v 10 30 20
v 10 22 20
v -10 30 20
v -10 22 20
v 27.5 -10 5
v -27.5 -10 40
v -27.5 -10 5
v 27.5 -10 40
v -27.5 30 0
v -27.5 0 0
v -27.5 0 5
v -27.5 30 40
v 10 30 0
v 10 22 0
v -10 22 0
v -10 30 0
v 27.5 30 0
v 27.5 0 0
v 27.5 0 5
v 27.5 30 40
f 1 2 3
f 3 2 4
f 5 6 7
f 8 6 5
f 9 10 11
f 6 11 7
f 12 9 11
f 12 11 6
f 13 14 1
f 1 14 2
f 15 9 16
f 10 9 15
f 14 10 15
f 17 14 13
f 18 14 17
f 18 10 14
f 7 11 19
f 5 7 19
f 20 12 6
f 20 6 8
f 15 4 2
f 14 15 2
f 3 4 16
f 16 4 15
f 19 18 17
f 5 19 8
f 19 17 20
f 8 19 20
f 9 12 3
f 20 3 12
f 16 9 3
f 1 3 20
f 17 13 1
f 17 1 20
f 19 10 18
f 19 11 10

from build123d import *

# Parameters (mm, degrees)
BOSS_EXTRUDE1_DEPTH = 30
SKETCH2_W           = 20
SKETCH2_H           = 20
BOSS_EXTRUDE2_DEPTH = 22
SKETCH3_W           = 55
SKETCH3_H           = 35
BOSS_EXTRUDE3_DEPTH = 10


with BuildPart() as part:
    # Sketch1 → Boss-Extrude1 (new body)
    with BuildSketch(Plane(origin=(0, 0, 0), x_dir=(1, 0, 0), z_dir=(0, 1, 0))):
        Polygon((-10, 0), (-27.5, 0), (-27.5, -40), (27.5, -40), (27.5, 0), (10, 0), (10, -20), (-10, -20), align=None)
    extrude(amount=BOSS_EXTRUDE1_DEPTH)

    # Sketch2 → Boss-Extrude2 (add)
    with BuildSketch(Plane.XZ):
        with Locations((0, 10)):
            Rectangle(SKETCH2_W, SKETCH2_H)
    extrude(amount=-BOSS_EXTRUDE2_DEPTH)

    # Sketch3 → Boss-Extrude3 (add)
    with BuildSketch(Plane.XZ):
        with Locations((0, 22.5)):
            Rectangle(SKETCH3_W, SKETCH3_H)
    extrude(amount=BOSS_EXTRUDE3_DEPTH)


solid = part.part
